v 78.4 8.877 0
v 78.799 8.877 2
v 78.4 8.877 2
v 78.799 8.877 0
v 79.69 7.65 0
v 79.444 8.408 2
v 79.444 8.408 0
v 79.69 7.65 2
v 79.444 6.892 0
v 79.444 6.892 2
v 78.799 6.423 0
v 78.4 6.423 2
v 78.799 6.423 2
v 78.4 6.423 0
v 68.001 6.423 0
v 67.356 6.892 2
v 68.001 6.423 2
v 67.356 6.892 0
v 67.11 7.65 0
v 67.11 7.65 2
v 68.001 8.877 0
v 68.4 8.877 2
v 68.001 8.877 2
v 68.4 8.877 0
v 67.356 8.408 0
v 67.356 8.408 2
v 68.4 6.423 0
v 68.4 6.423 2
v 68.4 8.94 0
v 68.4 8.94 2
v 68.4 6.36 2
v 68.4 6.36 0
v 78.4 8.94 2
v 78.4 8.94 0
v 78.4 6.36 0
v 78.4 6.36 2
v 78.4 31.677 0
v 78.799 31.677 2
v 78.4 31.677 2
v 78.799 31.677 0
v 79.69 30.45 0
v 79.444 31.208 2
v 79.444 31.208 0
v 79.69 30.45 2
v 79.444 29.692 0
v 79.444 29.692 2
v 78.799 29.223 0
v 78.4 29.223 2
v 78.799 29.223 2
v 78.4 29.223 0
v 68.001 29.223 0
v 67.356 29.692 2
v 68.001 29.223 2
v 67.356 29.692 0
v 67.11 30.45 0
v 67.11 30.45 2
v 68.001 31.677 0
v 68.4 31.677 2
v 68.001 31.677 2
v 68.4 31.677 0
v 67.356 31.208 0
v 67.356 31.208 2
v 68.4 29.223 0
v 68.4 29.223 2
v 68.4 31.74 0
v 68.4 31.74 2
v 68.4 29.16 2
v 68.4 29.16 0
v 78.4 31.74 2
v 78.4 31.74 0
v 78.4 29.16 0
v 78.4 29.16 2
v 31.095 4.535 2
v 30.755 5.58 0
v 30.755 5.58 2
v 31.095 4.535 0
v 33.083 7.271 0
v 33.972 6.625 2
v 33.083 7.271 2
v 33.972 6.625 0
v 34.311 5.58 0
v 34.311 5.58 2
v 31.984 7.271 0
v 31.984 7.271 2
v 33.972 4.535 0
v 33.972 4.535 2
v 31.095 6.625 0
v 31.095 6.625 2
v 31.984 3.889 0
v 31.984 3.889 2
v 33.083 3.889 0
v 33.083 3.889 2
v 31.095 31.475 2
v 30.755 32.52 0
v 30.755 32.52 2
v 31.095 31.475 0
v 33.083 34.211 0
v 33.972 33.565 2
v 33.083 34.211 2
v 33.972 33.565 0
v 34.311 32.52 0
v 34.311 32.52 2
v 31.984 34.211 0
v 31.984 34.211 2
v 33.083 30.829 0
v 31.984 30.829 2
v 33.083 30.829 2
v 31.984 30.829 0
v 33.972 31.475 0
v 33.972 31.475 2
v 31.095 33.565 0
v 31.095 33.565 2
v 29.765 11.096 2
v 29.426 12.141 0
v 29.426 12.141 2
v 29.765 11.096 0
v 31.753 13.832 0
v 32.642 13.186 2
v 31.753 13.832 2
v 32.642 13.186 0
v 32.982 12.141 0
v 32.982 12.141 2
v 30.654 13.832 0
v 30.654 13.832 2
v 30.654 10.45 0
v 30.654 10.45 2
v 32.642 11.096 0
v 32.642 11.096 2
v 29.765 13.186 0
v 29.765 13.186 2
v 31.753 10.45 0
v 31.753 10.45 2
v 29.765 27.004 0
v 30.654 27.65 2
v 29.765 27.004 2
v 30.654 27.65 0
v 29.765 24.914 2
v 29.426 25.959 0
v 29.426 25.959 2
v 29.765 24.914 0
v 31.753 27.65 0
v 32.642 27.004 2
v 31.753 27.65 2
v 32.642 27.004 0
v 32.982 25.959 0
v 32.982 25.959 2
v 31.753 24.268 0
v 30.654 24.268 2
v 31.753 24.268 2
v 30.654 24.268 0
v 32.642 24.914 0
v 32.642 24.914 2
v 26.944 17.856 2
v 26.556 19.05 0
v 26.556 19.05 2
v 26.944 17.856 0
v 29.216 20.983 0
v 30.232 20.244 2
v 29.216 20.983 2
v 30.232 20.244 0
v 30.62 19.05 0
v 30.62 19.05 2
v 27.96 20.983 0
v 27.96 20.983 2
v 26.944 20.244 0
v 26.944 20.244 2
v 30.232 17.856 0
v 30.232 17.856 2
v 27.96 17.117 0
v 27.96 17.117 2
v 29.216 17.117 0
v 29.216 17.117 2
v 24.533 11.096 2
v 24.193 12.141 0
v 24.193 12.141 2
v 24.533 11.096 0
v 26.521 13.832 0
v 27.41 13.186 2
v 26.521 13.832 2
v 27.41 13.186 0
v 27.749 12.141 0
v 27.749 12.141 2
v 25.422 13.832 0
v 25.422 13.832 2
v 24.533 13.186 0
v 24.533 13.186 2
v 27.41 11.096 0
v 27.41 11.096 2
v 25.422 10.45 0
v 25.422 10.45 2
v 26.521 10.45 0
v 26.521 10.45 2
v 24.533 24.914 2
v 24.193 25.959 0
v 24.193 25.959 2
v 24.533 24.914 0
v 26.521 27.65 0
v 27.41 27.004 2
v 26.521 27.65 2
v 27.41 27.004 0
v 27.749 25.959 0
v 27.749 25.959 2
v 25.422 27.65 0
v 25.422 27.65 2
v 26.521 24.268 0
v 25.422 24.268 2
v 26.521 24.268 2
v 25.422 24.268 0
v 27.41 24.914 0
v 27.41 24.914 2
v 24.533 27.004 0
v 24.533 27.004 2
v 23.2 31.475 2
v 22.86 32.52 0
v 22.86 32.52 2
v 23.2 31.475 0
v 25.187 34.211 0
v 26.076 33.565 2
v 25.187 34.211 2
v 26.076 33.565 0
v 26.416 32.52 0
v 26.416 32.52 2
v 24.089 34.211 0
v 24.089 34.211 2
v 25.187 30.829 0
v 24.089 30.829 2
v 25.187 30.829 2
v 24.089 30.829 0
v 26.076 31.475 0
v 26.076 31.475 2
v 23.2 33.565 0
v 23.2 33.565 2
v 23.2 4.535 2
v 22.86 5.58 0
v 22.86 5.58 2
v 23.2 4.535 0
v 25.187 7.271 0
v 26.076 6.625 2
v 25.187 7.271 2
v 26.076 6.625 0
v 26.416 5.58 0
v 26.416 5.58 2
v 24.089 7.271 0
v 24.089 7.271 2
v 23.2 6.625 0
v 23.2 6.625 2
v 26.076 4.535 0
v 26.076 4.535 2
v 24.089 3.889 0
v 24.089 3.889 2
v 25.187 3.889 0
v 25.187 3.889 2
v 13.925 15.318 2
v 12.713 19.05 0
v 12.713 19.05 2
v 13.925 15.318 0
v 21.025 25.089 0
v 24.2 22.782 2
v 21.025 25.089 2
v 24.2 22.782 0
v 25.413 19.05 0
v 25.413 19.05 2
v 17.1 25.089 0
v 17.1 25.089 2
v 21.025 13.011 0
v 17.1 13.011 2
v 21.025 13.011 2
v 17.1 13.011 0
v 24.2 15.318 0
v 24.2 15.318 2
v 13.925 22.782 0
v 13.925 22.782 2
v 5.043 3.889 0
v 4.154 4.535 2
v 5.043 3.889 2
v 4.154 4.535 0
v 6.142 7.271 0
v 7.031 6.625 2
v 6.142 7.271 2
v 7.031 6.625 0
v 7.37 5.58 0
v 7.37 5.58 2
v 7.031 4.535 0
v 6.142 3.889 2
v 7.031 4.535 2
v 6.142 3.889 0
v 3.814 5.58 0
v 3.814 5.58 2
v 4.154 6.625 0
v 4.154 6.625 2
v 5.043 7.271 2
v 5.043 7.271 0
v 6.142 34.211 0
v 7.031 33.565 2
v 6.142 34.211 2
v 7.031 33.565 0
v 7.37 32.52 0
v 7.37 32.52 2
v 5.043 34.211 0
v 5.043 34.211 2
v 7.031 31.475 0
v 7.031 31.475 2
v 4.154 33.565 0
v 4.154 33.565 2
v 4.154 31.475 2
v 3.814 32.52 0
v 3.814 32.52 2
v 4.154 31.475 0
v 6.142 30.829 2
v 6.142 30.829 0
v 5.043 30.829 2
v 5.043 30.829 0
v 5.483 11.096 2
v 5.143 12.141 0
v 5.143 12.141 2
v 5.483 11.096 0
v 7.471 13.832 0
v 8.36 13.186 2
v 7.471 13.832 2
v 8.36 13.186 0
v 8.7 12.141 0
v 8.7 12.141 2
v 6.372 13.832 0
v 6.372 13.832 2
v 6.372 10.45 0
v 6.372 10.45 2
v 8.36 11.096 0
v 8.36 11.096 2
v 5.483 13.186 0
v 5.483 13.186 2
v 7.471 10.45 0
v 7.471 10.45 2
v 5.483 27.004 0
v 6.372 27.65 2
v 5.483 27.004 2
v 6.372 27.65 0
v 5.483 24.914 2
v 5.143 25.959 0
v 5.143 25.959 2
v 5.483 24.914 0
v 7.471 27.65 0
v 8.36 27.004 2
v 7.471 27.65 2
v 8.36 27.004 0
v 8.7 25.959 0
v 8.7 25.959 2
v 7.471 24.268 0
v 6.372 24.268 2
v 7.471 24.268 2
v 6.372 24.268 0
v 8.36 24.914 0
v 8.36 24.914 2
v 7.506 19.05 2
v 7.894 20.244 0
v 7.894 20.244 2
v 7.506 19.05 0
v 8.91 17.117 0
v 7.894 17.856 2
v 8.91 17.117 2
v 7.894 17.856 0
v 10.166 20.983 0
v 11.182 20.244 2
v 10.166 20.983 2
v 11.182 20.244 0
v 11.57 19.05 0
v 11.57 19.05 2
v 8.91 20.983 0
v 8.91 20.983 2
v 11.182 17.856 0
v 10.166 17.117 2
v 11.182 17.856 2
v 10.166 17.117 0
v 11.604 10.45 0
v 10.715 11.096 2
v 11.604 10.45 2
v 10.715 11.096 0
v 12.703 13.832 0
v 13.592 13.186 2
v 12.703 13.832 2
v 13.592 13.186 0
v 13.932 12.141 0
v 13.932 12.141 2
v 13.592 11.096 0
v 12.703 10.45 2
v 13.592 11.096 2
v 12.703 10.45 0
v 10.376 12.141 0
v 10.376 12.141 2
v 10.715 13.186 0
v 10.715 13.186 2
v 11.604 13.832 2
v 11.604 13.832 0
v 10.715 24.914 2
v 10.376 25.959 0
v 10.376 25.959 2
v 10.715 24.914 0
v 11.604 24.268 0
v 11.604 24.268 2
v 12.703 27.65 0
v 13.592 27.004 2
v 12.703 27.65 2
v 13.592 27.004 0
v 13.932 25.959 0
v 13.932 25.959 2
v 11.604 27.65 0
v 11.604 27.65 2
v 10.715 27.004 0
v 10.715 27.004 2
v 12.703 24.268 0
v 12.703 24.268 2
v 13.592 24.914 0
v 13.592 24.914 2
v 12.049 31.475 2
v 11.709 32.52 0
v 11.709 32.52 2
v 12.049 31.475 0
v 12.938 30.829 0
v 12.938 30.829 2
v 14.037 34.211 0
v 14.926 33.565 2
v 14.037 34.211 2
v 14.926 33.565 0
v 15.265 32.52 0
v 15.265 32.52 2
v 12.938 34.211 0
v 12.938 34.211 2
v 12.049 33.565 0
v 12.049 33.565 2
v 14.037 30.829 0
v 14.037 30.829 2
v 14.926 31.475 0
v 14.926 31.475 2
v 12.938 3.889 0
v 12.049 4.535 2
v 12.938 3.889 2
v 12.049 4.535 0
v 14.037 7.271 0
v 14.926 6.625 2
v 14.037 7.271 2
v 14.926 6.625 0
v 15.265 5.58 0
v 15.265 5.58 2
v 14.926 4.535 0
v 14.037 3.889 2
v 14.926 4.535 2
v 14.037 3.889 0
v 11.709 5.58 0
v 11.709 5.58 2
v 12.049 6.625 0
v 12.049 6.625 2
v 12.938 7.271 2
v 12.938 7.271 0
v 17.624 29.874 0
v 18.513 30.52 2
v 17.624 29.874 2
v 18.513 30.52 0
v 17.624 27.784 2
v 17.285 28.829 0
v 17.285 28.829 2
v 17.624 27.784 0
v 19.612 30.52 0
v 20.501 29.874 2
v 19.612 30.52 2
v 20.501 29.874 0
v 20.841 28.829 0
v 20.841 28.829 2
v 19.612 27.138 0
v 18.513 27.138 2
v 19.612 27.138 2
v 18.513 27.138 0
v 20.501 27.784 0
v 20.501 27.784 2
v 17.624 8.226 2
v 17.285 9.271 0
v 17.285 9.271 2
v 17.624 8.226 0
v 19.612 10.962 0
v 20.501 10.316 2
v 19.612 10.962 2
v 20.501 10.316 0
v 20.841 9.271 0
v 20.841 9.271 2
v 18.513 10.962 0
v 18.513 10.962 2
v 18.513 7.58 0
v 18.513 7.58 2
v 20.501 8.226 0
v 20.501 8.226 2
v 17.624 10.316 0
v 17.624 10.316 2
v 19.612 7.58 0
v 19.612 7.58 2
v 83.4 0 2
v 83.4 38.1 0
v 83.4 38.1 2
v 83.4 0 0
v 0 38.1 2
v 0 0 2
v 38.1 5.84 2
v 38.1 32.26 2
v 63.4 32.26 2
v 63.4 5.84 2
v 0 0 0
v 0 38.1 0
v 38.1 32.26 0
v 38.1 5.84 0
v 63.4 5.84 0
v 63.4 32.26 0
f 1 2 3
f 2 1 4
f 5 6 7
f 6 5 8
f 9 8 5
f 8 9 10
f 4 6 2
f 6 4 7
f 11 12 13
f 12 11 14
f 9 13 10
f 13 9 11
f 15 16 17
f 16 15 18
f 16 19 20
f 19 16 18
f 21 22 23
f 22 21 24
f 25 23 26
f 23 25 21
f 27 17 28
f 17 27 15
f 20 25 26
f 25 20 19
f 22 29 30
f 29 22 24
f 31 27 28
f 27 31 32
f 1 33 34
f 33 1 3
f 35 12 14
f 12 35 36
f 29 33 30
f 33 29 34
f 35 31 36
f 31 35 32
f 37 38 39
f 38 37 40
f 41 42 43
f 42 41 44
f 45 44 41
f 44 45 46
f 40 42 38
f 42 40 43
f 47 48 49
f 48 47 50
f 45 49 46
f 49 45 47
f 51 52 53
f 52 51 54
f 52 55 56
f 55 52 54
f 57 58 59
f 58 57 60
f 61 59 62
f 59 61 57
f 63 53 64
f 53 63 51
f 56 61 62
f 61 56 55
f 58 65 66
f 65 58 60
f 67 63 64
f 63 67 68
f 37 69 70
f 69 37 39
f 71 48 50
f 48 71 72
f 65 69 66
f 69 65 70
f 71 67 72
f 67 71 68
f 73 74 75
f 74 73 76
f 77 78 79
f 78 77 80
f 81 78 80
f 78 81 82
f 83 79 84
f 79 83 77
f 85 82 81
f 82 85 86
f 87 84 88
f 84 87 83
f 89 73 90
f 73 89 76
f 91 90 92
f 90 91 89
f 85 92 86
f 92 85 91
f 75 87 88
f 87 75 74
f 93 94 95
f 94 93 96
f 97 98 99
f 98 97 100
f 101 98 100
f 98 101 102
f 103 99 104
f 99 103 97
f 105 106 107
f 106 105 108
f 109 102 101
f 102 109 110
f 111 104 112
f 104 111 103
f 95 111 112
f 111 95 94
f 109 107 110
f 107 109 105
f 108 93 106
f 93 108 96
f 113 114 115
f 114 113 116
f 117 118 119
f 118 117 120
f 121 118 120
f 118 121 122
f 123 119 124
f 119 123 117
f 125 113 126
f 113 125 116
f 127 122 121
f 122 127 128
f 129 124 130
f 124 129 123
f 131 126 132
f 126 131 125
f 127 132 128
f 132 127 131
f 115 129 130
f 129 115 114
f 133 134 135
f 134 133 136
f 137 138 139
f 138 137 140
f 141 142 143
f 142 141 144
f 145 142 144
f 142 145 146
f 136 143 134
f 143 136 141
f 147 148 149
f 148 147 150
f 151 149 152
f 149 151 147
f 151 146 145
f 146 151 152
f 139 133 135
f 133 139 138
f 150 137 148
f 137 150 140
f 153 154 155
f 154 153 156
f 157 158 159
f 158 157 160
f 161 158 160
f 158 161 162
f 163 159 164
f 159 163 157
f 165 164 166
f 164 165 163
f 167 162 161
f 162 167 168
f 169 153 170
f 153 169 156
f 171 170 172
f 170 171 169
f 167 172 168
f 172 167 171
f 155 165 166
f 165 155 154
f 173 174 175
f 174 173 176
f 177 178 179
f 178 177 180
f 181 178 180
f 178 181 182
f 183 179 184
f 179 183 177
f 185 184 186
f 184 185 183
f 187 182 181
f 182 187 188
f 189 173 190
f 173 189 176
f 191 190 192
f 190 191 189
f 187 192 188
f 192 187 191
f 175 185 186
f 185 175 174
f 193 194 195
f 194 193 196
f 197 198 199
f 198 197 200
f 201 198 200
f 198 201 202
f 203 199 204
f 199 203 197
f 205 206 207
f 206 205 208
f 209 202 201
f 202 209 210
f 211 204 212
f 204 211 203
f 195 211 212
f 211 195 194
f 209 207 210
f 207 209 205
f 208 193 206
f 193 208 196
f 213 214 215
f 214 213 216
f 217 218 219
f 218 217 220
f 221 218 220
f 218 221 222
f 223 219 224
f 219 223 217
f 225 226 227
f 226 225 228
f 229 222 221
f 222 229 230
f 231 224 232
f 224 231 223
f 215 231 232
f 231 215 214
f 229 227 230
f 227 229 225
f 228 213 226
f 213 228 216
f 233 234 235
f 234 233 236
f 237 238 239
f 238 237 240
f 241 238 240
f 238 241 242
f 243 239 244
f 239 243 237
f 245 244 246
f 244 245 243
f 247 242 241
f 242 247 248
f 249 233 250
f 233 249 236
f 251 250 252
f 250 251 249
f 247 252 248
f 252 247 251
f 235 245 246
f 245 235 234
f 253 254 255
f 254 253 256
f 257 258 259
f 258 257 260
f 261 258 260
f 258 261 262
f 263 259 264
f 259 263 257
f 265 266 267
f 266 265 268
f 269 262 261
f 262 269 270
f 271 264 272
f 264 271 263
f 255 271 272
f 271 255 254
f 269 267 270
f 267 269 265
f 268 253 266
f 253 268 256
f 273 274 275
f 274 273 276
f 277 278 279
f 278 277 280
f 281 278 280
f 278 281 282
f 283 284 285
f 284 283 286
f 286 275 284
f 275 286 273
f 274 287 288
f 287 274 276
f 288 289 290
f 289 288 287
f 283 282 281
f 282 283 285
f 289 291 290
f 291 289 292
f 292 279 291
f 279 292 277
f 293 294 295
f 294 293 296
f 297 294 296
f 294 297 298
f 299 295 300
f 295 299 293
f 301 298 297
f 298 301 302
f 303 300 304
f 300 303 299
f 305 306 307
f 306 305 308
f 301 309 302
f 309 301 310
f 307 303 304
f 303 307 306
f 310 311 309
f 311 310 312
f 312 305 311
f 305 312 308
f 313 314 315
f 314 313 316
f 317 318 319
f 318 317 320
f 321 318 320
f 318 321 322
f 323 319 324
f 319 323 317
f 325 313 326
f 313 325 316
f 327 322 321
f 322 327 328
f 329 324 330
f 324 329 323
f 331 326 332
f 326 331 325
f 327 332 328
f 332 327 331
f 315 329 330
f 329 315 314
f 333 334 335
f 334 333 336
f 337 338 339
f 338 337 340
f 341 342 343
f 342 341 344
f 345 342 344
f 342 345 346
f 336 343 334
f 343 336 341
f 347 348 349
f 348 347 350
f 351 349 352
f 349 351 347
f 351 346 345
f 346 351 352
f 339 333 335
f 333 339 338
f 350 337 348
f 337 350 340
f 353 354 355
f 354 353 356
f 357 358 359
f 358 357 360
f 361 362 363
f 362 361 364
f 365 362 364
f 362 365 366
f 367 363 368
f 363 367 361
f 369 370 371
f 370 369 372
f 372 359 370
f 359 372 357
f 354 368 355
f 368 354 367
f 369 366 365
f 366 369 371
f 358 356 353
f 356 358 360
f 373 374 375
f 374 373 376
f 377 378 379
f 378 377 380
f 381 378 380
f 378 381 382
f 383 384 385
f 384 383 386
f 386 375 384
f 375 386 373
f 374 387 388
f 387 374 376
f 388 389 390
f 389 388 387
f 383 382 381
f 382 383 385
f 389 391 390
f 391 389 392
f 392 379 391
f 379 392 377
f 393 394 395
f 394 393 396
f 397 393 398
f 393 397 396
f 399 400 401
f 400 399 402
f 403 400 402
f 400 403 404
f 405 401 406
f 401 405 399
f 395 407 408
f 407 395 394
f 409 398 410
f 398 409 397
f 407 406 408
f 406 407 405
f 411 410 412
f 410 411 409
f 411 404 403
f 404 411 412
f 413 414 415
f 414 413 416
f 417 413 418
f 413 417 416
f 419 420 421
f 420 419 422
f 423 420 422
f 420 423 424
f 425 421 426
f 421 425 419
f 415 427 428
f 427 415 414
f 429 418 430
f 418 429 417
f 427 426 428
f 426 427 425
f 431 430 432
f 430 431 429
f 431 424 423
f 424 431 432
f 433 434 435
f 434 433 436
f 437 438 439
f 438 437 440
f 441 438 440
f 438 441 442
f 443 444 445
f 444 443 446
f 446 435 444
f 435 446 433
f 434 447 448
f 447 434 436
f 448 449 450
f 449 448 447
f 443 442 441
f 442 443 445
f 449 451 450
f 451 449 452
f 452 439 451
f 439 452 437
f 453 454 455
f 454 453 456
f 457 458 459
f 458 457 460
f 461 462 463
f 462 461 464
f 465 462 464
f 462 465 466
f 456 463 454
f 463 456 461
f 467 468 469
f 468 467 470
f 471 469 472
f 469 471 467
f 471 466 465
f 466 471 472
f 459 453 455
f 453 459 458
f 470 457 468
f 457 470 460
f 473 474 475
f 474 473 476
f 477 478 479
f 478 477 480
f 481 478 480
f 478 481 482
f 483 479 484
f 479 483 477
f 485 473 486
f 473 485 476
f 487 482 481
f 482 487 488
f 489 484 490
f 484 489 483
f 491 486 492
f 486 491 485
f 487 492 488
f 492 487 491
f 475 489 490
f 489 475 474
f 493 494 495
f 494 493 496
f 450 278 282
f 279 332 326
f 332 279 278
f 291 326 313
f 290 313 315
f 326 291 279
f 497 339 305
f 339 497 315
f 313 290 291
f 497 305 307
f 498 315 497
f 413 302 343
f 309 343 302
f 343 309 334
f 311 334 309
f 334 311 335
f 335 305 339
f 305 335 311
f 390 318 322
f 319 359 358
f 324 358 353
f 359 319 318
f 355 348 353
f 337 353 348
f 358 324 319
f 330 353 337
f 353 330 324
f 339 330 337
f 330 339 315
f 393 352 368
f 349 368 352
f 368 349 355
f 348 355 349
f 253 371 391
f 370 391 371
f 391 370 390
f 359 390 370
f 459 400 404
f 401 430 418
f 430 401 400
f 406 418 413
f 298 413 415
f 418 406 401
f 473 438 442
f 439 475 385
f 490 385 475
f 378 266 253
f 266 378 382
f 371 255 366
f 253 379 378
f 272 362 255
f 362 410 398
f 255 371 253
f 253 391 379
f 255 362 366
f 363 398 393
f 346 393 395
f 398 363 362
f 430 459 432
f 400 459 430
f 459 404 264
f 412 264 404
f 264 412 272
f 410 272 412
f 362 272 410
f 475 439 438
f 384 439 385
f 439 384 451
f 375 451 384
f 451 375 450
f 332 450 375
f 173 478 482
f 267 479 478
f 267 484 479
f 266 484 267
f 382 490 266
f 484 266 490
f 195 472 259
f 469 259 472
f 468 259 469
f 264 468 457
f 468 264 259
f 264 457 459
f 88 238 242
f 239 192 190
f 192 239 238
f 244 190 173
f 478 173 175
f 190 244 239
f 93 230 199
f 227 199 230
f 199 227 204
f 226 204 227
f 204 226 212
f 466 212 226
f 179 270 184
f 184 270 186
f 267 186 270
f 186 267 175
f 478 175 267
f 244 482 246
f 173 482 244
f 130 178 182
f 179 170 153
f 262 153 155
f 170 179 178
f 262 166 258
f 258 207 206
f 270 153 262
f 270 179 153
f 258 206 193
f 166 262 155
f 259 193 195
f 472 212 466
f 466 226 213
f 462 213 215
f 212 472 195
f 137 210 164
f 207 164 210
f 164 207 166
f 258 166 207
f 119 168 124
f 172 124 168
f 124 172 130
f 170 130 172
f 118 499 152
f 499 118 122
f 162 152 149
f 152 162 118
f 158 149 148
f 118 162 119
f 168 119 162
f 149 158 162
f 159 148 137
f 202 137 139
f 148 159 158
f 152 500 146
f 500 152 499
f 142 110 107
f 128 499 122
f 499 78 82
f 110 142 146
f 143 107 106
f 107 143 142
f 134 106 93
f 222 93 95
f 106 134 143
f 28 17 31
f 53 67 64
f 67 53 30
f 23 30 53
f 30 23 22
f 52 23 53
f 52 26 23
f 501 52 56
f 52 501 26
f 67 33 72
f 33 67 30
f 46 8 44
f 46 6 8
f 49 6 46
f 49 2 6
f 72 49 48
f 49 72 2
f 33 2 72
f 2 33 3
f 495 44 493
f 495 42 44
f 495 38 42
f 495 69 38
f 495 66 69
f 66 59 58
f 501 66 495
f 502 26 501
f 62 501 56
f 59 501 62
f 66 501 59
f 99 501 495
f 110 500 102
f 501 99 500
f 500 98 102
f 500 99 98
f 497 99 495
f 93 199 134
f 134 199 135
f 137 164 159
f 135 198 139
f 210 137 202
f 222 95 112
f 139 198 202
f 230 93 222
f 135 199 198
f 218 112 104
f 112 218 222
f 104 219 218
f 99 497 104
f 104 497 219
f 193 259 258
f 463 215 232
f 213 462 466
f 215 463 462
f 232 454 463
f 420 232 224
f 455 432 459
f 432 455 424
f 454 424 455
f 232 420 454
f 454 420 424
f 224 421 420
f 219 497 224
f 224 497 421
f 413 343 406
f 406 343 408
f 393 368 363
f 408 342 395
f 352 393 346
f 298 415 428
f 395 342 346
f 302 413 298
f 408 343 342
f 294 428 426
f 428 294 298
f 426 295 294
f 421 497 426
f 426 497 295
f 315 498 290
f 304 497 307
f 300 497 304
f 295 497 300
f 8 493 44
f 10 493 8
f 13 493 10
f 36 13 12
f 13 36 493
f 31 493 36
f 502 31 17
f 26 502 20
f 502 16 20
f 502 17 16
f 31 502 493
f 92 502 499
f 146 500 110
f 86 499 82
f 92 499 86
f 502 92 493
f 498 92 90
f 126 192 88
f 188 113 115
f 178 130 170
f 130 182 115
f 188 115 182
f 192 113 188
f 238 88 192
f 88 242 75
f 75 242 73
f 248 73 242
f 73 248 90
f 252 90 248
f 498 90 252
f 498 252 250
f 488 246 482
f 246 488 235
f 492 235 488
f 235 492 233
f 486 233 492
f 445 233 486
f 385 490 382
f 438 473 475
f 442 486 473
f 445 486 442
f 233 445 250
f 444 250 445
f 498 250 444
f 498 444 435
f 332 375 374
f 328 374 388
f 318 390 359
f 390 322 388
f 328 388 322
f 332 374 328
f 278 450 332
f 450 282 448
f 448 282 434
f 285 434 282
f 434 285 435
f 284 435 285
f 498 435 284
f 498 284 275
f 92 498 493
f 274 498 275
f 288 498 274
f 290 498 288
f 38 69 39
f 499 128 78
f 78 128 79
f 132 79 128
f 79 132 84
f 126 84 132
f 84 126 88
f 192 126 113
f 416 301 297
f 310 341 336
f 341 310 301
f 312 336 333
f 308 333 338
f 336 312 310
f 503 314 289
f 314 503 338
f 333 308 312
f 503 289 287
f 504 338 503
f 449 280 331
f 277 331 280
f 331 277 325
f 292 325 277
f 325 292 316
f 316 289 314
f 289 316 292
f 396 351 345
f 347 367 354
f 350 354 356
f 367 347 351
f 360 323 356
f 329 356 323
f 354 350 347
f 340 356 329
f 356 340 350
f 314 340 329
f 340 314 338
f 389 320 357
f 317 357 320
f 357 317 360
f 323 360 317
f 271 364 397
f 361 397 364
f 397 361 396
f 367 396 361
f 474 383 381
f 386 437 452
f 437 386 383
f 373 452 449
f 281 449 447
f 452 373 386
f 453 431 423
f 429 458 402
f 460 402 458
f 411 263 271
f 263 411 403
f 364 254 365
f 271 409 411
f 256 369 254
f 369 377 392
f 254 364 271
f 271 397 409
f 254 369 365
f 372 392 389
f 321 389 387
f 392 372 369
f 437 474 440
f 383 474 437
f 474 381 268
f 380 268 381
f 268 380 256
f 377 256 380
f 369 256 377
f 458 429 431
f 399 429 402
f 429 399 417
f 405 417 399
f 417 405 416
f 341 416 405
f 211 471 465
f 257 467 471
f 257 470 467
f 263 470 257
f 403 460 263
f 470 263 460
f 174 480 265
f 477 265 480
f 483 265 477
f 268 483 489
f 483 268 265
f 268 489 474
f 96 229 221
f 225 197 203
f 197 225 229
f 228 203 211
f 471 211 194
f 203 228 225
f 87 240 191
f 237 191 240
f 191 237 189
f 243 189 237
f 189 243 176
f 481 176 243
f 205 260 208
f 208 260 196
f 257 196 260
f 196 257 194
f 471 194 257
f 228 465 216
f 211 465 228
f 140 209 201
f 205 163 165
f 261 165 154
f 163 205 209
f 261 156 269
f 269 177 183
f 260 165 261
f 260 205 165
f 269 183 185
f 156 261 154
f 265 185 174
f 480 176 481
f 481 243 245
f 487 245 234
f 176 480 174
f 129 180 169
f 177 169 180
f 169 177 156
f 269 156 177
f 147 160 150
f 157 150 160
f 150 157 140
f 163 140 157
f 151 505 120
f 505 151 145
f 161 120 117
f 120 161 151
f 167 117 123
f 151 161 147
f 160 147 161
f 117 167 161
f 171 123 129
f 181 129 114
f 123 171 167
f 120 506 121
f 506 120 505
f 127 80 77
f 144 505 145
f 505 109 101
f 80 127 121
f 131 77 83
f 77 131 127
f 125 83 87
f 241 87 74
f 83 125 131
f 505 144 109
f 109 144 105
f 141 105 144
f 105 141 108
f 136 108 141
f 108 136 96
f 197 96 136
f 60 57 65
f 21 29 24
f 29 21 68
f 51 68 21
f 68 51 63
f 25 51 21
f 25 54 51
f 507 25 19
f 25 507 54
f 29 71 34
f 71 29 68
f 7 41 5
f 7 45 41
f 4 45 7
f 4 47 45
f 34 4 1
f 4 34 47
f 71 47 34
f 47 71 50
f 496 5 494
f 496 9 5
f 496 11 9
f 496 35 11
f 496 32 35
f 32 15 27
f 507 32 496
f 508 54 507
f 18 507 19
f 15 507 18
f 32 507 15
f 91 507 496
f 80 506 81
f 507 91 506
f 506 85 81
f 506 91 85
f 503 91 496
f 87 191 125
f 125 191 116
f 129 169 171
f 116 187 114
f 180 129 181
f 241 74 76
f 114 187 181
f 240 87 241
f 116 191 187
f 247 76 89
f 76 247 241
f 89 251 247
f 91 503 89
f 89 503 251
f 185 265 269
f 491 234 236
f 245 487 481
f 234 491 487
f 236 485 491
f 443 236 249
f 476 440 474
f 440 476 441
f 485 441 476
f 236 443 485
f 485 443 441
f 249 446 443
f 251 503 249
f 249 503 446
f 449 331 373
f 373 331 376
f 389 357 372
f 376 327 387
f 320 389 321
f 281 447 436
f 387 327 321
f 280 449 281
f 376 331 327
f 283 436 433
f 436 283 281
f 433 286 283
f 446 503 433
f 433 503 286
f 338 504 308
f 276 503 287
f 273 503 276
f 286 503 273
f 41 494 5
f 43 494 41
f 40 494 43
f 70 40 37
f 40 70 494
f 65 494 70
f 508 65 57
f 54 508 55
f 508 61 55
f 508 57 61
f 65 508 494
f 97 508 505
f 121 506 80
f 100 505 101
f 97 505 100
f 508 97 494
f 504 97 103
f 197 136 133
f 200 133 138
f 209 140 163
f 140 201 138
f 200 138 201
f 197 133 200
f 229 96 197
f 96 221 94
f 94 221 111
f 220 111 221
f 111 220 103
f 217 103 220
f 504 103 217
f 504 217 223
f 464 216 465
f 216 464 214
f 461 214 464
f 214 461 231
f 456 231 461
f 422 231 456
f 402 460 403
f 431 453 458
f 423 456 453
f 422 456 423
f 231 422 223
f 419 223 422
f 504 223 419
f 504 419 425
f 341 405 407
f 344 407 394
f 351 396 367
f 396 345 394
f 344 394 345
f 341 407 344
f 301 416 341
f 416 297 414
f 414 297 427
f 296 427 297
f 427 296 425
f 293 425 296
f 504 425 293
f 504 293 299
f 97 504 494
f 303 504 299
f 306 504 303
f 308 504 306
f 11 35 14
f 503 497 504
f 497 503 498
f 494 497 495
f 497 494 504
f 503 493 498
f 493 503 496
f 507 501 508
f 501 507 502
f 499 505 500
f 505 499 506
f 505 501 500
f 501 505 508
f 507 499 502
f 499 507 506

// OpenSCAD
// file: acrobotics.scad
inch_to_mm = 25.4;

acrobotics_channel_width = 1.50*inch_to_mm;
acrobotics_hole_spacing = 1.50/2*inch_to_mm;
acrobotics_first_hole = (0.22 + 1.061/2)*inch_to_mm;
acrobotics_thickness = 0.09*inch_to_mm;

// Makes a pattern of Acrobotics holes, facing toward +Z and
// aligned so that a channel would go down the X axis.
// The large hole is at the origin. Specify the height of the holes.
// The patterns share some holes. By default this module produces
// the shared holes on the left. Specify "right_end = true" to also
// make the shared holes on the right, for the right-most last set
// in a channel.
//
// See diagrams here:
//     https://www.servocity.com/html/3_00__aluminum_channel__585442.html
module acrobotics_holes(height, right_end) {
    // These numbers are all in inches, from the Acrobotics website.
    large_radius_in = 0.25;
    medium_radius_in = 0.08;
    small_radius_in = 0.07;
    large_hole_spacing_in = 1.50/2;
    large_diagonal_spacing_in = 1.50;
    small_diagonal_spacing_in = 0.77;
    large_orthogonal_spacing_in = large_diagonal_spacing_in/sqrt(2);
    
    // Convert to mm.
    large_radius = large_radius_in*inch_to_mm;
    medium_radius = medium_radius_in*inch_to_mm;
    small_radius = small_radius_in*inch_to_mm;
    large_hole_spacing = large_hole_spacing_in*inch_to_mm;
    small_diagonal_spacing = small_diagonal_spacing_in*inch_to_mm;
    large_orthogonal_spacing = large_orthogonal_spacing_in*inch_to_mm;

    module hole(x, y, r) {
        translate([x, y, 0]) {
            cylinder(height, r, r);
        }
    }
    
    module small_hole(x, y) {
        hole(x, y, small_radius);
    }

    module medium_hole(x, y) {
        hole(x, y, medium_radius);
    }

    module large_hole(x, y) {
        hole(x, y, large_radius);
    }

    // Large center hole.
    large_hole(0, 0);

    // Left-most two holes, very top and bottom.
    first_x = large_orthogonal_spacing/2;
    first_y = large_orthogonal_spacing/2;
    small_hole(-first_x, -first_y);
    small_hole(-first_x, first_y);
    
    // Next two holes to the right of that.
    second_x = 0.956/2*inch_to_mm;   
    second_y = 0.544/2*inch_to_mm;
    small_hole(-second_x, -second_y);
    small_hole(-second_x, second_y);
    
    // Single hole to the right of that.
    third_x = 1.50/4*inch_to_mm;
    medium_hole(-third_x, 0);
    
    // The next two are symmetric with the second pair.
    small_hole(-large_hole_spacing+second_x, -second_y);
    small_hole(-large_hole_spacing+second_x, second_y);
    
    // The next two holes to the right of that.
    fourth_x = 0.439/2*inch_to_mm;
    small_hole(-fourth_x, first_y);
    small_hole(-fourth_x, -first_y);
    
    // Holes directly above and below the large hole.
    fifth_y = small_diagonal_spacing/2;
    small_hole(0, fifth_y);
    small_hole(0, -fifth_y);
    
    if (right_end) {
        small_hole(first_x, -first_y);
        small_hole(first_x, first_y);
        small_hole(second_x, -second_y);
        small_hole(second_x, second_y);
        medium_hole(third_x, 0);
        small_hole(large_hole_spacing-second_x, -second_y);
        small_hole(large_hole_spacing-second_x, second_y);
        small_hole(fourth_x, first_y);
        small_hole(fourth_x, -first_y);
    }
}

// Goes toward the +x axis, with a corner at the origin and
// the rest in the positive Y and Z semispaces. The holes
// face up (Z).
module acrobotics_plate(count) {
    length = (count + 1)*acrobotics_channel_width/2;
    difference() {
        cube([length, acrobotics_channel_width, acrobotics_thickness]);
        for (i = [0 : count - 1]) {
            translate([acrobotics_first_hole + acrobotics_hole_spacing*i, acrobotics_channel_width/2, -acrobotics_thickness/2]) {
                acrobotics_holes(acrobotics_thickness*2, i == count - 1);
            }
        }
    }
}

// Goes toward the +x axis, with a corner at the origin and
// the rest in the positive Y and Z semispaces. The open part
// of the channel is at +Z.
module acrobotics_channel(count) {
    acrobotics_plate(count);
    translate([0, acrobotics_thickness, 0]) {
        rotate([90, 0, 0]) {
            acrobotics_plate(count);
        }
    }
    translate([0, acrobotics_channel_width, 0]) {
        rotate([90, 0, 0]) {
            acrobotics_plate(count);
        }
    }
}
// file: config.scad
// Units are mm

$fn = 10;

// Measured on PCB:
hole_radius = 2.58/2;
hole_short_distance = 12.5;
hole_long_distance = 22.8;
hole_edge_clearance = 2.63; // Edge of hole to pins.

// Measured elsewhere (bracket, etc.):
center_from_left = 19.1;

// Made-up numbers:
pin_margin = 1;
plate_thickness = 2;
support_radius = 3;
bracket_height = 15;
bracket_hole_length = 3; // Between centers of holes.
bracket_thickness = plate_thickness;

// Computed:
hole_center_clearance = hole_edge_clearance + hole_radius;
arm_radius = hole_center_clearance - pin_margin;
center_from_right = arm_radius + hole_short_distance/2;
plate_width = center_from_right + center_from_left;
plate_height = hole_long_distance + arm_radius*2;

// This hole is along the X axis. Z is the bottom of the hole.
// It goes from X = 0 to X = +.
module bracket_hole(y, z, length) {
    translate ([-bracket_thickness/2, y, z]) {
        rotate ([0, 90, 0]) {
            cylinder(bracket_thickness*2, hole_radius, hole_radius);
        }
    }
    translate ([-bracket_thickness/2, y, z + length]) {
        rotate ([0, 90, 0]) {
            cylinder(bracket_thickness*2, hole_radius, hole_radius);
        }
    }
    translate ([-bracket_thickness/2, y - hole_radius, z]) {
        cube([bracket_thickness*2, hole_radius*2, length]);
    }
}
// main file
// Adapter between the aluminum channel and the PCB plate. Units are mm.

include <config.scad>;
include <acrobotics.scad>;

adapter_height = acrobotics_channel_width;
shaft_length = 38.1; // D-shaft sticking out + adapter + magnet, measured.
as5045_spacing = 1;  // They ask for 1mm spacing.
as5045_thickness = 6.2; // Thickness of board and chip, measured.
adapter_length = acrobotics_channel_width + shaft_length + as5045_spacing + as5045_thickness;
echo(adapter_length);
bracket_hole_margin = 5;
bracket_hole_long_length = 10;

difference() {
    cube([adapter_length, adapter_height, plate_thickness]);
    translate([0, (adapter_height - plate_height)/2, 0]) {
        rotate([0, -90, 0]) {
            bracket_hole(arm_radius, -adapter_length + bracket_hole_margin, bracket_hole_long_length);
            bracket_hole(plate_height - arm_radius, -adapter_length + bracket_hole_margin, bracket_hole_long_length);
        }
    }
    translate([acrobotics_first_hole, adapter_height/2, -plate_thickness/2]) {
        acrobotics_holes(plate_thickness*2, true);
    }
    translate([acrobotics_channel_width, arm_radius*2, -plate_thickness/2]) {
        cube([adapter_length - acrobotics_channel_width - bracket_hole_long_length - bracket_hole_margin*2, adapter_height - arm_radius*4, plate_thickness*2]);
    }
 }
